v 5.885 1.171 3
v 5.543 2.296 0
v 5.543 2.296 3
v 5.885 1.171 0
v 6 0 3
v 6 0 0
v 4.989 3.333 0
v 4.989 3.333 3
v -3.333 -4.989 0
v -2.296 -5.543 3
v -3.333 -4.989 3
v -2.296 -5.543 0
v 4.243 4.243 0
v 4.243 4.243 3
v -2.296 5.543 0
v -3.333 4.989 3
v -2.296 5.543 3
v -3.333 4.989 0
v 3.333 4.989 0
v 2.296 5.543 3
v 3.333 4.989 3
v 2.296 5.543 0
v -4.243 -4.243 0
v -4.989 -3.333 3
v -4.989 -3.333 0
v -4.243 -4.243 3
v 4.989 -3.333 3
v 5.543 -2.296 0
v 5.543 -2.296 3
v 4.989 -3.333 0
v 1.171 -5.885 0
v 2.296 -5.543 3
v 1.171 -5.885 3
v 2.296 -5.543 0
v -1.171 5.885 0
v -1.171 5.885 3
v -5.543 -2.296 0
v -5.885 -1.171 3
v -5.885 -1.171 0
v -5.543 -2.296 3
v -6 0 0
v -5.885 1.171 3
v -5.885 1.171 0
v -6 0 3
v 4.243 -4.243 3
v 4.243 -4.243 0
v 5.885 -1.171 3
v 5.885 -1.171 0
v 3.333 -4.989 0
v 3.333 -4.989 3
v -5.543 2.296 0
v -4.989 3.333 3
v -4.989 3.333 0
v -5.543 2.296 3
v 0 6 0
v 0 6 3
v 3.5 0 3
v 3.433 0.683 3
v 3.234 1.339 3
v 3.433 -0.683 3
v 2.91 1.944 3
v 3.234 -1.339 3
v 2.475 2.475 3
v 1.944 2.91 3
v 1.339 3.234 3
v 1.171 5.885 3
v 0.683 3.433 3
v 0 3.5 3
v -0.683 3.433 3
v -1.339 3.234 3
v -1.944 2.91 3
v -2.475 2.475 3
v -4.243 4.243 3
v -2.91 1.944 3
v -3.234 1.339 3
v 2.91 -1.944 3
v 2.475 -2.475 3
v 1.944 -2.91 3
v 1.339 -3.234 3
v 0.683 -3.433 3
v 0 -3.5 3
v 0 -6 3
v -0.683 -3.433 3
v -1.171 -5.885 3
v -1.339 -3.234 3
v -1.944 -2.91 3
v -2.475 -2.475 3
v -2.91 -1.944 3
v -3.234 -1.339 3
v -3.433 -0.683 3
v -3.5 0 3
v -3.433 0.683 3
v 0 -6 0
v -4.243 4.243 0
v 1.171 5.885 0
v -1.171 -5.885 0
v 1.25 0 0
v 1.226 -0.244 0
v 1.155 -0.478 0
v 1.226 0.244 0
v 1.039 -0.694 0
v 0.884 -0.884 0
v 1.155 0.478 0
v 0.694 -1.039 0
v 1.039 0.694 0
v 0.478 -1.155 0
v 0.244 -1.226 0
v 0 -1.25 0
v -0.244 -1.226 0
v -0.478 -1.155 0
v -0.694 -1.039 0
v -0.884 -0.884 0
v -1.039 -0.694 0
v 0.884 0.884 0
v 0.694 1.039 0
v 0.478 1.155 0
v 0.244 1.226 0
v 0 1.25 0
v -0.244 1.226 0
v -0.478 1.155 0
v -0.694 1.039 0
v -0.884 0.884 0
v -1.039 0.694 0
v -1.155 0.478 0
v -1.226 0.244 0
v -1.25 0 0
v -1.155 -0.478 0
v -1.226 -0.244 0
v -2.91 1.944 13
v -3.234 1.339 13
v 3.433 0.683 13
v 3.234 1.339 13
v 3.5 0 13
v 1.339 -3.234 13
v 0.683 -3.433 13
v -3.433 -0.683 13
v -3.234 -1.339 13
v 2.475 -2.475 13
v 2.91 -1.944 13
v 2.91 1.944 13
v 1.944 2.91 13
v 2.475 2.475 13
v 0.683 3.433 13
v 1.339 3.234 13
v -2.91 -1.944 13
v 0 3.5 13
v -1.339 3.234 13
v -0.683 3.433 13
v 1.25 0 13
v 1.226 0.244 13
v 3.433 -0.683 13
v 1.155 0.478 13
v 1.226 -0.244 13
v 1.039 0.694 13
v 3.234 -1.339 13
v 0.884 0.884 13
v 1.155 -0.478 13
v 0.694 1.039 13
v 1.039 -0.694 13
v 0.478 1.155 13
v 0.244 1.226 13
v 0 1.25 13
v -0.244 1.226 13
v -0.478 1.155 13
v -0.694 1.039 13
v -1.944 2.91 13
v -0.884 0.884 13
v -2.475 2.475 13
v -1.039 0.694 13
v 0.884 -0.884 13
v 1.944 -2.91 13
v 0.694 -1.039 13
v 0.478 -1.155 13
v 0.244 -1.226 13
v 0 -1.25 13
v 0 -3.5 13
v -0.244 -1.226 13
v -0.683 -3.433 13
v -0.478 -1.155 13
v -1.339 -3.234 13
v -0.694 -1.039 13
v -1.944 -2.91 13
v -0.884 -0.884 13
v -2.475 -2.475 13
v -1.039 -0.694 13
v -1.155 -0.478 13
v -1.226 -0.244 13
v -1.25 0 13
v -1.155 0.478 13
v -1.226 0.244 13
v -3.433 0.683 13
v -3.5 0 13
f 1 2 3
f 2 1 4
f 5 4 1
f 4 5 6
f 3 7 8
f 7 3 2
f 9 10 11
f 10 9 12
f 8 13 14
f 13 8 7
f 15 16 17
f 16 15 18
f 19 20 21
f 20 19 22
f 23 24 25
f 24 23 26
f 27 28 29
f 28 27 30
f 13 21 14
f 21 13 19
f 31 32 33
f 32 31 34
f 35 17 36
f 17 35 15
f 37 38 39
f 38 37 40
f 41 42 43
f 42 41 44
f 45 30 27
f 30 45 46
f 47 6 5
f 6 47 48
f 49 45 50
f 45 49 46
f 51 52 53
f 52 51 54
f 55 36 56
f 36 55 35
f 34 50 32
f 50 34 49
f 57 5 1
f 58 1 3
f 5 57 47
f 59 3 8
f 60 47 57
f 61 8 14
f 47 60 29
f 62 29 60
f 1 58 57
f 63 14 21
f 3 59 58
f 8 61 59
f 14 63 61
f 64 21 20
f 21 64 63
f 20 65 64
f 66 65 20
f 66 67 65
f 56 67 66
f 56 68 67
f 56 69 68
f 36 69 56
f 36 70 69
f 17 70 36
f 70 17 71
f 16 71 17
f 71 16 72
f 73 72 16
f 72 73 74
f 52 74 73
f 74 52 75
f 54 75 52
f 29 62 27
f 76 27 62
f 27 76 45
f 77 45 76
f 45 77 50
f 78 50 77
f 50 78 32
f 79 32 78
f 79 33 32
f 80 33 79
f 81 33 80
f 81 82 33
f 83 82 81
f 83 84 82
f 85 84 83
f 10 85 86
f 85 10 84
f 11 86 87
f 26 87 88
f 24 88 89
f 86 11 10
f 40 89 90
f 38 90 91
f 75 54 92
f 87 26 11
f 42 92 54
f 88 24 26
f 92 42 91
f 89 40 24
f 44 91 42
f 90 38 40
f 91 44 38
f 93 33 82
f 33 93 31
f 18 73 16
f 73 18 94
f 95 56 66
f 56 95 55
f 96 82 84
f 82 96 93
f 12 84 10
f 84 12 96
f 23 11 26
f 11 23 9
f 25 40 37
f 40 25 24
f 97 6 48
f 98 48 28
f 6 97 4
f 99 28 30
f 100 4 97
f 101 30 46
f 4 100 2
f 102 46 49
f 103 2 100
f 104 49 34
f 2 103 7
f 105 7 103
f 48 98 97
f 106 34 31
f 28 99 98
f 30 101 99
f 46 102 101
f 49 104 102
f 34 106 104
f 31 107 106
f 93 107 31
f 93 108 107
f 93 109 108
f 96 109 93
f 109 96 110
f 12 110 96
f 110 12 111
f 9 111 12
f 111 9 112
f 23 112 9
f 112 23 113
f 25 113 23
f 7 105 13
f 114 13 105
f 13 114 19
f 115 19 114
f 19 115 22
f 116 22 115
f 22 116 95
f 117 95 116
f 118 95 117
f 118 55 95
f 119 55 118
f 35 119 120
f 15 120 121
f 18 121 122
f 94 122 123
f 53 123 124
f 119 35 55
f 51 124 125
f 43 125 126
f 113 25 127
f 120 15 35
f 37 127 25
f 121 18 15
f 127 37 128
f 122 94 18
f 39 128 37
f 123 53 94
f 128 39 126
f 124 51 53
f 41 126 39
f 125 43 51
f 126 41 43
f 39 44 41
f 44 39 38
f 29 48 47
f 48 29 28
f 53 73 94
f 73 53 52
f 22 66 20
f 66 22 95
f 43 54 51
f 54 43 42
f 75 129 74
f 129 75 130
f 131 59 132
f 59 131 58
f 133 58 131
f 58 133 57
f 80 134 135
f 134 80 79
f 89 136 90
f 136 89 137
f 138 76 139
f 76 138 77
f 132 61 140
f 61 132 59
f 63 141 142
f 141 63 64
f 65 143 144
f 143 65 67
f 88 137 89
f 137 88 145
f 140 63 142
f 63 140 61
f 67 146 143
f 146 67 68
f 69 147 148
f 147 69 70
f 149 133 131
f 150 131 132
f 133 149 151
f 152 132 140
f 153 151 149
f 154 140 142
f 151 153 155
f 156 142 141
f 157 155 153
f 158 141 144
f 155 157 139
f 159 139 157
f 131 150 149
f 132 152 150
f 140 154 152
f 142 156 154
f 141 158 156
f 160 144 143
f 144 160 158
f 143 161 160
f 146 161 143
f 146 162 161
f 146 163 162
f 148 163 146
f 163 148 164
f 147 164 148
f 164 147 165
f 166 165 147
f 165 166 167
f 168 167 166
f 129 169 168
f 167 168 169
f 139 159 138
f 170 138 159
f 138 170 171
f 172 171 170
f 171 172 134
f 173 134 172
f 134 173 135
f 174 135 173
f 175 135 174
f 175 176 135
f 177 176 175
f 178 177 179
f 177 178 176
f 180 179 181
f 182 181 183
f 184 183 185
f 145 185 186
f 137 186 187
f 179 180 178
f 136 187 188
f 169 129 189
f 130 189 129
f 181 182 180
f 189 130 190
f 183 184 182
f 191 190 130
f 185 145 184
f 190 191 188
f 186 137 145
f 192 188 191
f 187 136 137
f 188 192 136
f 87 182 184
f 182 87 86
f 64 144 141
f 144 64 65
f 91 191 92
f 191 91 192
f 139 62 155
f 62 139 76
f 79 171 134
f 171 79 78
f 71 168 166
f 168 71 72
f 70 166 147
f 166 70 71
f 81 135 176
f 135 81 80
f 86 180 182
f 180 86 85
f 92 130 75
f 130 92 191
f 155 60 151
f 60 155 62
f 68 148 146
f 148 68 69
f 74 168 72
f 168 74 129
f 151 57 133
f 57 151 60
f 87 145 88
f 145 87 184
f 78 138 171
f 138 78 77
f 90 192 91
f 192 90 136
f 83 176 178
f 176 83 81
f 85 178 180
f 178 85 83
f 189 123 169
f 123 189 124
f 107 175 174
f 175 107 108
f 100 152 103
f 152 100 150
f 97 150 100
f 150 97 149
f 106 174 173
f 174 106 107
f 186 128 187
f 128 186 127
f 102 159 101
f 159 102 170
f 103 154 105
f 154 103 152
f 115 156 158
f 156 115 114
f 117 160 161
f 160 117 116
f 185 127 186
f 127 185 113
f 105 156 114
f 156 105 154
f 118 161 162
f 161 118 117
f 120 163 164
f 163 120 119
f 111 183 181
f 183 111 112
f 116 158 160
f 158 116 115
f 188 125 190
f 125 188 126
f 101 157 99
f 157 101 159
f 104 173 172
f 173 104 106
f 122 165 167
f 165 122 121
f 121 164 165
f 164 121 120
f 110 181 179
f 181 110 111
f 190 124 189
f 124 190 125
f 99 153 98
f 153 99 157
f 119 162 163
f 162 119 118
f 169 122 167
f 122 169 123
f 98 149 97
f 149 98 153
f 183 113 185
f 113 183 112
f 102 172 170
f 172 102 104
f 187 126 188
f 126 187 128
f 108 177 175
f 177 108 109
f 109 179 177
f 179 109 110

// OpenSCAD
$fn = 32;

// ----------------------------------------------------------------------
// Micro post: flanged post, 5-20 mm class
// ----------------------------------------------------------------------

// --- parameters (mm) ---
post_d = 7;               // post diameter
post_h = 10;              // post height above the flange
flange_d = 12;            // flange diameter
flange_t = 3;             // flange thickness
bore_d = 2.5;             // through bore

total_h = post_h + flange_t;  // overall height

difference() {
  union() {
    cylinder(h = flange_t, d = flange_d);
    translate([0, 0, flange_t]) cylinder(h = post_h, d = post_d);
  }
  translate([0, 0, -1]) cylinder(h = total_h + 2, d = bore_d);
}
